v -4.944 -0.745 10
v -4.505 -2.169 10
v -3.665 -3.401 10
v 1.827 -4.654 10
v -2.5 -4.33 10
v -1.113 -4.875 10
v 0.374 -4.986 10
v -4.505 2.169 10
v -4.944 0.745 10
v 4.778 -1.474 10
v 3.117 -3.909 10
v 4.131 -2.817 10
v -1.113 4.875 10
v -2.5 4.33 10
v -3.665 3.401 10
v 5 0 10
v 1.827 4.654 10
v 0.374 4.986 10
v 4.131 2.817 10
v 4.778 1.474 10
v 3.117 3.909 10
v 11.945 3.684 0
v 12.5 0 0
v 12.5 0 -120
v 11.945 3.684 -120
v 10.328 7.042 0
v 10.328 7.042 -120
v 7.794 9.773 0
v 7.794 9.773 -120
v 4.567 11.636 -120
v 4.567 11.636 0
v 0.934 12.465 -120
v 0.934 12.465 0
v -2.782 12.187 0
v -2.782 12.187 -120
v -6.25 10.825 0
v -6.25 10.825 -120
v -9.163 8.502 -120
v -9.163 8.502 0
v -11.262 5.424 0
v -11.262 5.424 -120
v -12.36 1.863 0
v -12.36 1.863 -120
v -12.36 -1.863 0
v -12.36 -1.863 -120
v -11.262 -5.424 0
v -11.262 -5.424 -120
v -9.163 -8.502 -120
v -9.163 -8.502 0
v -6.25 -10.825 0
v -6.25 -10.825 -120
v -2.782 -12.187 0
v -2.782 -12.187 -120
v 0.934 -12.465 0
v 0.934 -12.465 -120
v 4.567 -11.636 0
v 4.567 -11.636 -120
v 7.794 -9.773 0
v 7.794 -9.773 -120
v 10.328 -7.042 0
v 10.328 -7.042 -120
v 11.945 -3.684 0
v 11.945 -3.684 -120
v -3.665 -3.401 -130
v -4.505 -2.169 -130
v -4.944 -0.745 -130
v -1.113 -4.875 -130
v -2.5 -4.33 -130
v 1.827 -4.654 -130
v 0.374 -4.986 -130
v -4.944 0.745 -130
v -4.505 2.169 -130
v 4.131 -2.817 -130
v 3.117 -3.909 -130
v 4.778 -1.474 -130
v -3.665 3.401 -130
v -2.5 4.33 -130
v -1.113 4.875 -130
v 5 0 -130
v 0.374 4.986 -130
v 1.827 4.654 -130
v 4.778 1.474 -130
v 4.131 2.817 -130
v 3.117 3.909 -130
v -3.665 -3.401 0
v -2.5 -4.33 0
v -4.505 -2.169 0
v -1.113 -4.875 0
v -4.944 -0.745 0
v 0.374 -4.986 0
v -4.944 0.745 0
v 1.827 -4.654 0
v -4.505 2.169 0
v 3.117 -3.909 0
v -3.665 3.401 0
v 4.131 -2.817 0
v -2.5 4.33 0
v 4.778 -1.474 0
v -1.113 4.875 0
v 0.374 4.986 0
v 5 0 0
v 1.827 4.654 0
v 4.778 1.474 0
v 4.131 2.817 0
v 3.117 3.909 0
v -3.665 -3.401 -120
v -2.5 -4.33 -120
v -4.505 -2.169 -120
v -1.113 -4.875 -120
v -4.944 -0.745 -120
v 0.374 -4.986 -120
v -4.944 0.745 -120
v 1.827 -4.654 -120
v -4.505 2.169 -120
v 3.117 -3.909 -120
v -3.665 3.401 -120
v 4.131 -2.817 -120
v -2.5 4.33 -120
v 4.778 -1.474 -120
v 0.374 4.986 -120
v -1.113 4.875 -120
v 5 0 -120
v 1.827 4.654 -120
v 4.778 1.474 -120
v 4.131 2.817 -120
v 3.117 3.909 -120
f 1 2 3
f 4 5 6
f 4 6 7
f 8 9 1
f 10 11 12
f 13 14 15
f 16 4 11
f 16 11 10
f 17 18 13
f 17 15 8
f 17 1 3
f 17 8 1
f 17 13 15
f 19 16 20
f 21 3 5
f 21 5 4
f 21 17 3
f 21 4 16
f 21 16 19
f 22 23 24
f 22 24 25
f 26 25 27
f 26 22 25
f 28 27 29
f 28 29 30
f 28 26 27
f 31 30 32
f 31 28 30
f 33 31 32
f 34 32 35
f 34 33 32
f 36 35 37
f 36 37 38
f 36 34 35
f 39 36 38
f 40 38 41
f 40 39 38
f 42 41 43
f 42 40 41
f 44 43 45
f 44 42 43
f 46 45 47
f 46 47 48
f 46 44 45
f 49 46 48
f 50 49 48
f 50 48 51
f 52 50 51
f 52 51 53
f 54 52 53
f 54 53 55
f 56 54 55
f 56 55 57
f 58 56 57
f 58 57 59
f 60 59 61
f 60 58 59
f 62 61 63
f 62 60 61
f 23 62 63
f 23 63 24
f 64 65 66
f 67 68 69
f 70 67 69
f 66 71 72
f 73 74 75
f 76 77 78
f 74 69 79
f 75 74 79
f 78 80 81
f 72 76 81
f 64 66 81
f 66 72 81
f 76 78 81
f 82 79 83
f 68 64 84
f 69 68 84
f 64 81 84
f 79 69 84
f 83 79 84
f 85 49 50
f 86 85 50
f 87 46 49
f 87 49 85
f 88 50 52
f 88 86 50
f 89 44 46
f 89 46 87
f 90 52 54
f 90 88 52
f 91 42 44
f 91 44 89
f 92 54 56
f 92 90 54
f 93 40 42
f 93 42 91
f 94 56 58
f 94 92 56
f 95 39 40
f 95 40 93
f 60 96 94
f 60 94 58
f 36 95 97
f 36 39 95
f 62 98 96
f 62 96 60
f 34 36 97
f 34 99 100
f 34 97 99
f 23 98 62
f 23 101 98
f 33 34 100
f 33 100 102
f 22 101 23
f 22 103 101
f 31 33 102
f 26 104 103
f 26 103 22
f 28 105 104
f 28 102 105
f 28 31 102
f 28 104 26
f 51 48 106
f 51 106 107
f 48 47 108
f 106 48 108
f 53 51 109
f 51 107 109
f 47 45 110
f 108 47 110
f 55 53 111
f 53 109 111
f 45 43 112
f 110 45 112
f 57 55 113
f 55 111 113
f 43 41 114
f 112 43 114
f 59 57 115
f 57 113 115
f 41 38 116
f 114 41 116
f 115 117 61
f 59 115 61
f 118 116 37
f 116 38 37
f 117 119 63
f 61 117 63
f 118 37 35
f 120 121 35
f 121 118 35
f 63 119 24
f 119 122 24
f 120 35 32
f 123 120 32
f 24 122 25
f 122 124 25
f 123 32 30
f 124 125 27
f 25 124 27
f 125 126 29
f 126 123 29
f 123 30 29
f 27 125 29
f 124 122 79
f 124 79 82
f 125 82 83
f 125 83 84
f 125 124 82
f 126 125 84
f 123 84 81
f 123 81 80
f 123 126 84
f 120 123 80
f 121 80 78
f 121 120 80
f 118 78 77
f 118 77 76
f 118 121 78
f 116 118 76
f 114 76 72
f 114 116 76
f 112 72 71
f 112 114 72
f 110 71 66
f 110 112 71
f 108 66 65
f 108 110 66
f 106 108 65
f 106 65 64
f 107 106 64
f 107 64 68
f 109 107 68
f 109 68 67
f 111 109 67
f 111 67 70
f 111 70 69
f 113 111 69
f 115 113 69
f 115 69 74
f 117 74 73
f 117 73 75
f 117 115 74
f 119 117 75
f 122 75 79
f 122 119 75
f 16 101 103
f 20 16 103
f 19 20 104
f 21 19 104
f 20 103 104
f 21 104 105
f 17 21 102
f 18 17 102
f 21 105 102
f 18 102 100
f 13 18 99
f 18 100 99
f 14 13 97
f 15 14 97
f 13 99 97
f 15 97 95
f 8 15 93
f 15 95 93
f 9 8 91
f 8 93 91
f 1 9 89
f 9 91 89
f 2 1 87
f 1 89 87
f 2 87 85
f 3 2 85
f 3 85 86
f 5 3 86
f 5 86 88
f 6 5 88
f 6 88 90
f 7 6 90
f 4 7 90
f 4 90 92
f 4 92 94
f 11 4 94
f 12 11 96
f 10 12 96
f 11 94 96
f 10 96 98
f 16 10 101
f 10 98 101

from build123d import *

# Parameters (mm, degrees)
SKETCH2_R           = 12.5
BOSS_EXTRUDE1_DEPTH = 120
SKETCH3_R           = 5
BOSS_EXTRUDE2_DEPTH = 10


with BuildPart() as part:
    # Sketch2 → Boss-Extrude1 (new body)
    with BuildSketch(Plane.XY):
        Circle(SKETCH2_R)
    extrude(amount=-BOSS_EXTRUDE1_DEPTH)

    # Sketch3 → Boss-Extrude2 (add)
    with BuildSketch(Plane.XY):
        Circle(SKETCH3_R)
    boss_extrude2 = extrude(amount=BOSS_EXTRUDE2_DEPTH)

    # Mirror1: Boss-Extrude2 across plane
    add(boss_extrude2.mirror(Plane.XY.offset(-60)))


solid = part.part
